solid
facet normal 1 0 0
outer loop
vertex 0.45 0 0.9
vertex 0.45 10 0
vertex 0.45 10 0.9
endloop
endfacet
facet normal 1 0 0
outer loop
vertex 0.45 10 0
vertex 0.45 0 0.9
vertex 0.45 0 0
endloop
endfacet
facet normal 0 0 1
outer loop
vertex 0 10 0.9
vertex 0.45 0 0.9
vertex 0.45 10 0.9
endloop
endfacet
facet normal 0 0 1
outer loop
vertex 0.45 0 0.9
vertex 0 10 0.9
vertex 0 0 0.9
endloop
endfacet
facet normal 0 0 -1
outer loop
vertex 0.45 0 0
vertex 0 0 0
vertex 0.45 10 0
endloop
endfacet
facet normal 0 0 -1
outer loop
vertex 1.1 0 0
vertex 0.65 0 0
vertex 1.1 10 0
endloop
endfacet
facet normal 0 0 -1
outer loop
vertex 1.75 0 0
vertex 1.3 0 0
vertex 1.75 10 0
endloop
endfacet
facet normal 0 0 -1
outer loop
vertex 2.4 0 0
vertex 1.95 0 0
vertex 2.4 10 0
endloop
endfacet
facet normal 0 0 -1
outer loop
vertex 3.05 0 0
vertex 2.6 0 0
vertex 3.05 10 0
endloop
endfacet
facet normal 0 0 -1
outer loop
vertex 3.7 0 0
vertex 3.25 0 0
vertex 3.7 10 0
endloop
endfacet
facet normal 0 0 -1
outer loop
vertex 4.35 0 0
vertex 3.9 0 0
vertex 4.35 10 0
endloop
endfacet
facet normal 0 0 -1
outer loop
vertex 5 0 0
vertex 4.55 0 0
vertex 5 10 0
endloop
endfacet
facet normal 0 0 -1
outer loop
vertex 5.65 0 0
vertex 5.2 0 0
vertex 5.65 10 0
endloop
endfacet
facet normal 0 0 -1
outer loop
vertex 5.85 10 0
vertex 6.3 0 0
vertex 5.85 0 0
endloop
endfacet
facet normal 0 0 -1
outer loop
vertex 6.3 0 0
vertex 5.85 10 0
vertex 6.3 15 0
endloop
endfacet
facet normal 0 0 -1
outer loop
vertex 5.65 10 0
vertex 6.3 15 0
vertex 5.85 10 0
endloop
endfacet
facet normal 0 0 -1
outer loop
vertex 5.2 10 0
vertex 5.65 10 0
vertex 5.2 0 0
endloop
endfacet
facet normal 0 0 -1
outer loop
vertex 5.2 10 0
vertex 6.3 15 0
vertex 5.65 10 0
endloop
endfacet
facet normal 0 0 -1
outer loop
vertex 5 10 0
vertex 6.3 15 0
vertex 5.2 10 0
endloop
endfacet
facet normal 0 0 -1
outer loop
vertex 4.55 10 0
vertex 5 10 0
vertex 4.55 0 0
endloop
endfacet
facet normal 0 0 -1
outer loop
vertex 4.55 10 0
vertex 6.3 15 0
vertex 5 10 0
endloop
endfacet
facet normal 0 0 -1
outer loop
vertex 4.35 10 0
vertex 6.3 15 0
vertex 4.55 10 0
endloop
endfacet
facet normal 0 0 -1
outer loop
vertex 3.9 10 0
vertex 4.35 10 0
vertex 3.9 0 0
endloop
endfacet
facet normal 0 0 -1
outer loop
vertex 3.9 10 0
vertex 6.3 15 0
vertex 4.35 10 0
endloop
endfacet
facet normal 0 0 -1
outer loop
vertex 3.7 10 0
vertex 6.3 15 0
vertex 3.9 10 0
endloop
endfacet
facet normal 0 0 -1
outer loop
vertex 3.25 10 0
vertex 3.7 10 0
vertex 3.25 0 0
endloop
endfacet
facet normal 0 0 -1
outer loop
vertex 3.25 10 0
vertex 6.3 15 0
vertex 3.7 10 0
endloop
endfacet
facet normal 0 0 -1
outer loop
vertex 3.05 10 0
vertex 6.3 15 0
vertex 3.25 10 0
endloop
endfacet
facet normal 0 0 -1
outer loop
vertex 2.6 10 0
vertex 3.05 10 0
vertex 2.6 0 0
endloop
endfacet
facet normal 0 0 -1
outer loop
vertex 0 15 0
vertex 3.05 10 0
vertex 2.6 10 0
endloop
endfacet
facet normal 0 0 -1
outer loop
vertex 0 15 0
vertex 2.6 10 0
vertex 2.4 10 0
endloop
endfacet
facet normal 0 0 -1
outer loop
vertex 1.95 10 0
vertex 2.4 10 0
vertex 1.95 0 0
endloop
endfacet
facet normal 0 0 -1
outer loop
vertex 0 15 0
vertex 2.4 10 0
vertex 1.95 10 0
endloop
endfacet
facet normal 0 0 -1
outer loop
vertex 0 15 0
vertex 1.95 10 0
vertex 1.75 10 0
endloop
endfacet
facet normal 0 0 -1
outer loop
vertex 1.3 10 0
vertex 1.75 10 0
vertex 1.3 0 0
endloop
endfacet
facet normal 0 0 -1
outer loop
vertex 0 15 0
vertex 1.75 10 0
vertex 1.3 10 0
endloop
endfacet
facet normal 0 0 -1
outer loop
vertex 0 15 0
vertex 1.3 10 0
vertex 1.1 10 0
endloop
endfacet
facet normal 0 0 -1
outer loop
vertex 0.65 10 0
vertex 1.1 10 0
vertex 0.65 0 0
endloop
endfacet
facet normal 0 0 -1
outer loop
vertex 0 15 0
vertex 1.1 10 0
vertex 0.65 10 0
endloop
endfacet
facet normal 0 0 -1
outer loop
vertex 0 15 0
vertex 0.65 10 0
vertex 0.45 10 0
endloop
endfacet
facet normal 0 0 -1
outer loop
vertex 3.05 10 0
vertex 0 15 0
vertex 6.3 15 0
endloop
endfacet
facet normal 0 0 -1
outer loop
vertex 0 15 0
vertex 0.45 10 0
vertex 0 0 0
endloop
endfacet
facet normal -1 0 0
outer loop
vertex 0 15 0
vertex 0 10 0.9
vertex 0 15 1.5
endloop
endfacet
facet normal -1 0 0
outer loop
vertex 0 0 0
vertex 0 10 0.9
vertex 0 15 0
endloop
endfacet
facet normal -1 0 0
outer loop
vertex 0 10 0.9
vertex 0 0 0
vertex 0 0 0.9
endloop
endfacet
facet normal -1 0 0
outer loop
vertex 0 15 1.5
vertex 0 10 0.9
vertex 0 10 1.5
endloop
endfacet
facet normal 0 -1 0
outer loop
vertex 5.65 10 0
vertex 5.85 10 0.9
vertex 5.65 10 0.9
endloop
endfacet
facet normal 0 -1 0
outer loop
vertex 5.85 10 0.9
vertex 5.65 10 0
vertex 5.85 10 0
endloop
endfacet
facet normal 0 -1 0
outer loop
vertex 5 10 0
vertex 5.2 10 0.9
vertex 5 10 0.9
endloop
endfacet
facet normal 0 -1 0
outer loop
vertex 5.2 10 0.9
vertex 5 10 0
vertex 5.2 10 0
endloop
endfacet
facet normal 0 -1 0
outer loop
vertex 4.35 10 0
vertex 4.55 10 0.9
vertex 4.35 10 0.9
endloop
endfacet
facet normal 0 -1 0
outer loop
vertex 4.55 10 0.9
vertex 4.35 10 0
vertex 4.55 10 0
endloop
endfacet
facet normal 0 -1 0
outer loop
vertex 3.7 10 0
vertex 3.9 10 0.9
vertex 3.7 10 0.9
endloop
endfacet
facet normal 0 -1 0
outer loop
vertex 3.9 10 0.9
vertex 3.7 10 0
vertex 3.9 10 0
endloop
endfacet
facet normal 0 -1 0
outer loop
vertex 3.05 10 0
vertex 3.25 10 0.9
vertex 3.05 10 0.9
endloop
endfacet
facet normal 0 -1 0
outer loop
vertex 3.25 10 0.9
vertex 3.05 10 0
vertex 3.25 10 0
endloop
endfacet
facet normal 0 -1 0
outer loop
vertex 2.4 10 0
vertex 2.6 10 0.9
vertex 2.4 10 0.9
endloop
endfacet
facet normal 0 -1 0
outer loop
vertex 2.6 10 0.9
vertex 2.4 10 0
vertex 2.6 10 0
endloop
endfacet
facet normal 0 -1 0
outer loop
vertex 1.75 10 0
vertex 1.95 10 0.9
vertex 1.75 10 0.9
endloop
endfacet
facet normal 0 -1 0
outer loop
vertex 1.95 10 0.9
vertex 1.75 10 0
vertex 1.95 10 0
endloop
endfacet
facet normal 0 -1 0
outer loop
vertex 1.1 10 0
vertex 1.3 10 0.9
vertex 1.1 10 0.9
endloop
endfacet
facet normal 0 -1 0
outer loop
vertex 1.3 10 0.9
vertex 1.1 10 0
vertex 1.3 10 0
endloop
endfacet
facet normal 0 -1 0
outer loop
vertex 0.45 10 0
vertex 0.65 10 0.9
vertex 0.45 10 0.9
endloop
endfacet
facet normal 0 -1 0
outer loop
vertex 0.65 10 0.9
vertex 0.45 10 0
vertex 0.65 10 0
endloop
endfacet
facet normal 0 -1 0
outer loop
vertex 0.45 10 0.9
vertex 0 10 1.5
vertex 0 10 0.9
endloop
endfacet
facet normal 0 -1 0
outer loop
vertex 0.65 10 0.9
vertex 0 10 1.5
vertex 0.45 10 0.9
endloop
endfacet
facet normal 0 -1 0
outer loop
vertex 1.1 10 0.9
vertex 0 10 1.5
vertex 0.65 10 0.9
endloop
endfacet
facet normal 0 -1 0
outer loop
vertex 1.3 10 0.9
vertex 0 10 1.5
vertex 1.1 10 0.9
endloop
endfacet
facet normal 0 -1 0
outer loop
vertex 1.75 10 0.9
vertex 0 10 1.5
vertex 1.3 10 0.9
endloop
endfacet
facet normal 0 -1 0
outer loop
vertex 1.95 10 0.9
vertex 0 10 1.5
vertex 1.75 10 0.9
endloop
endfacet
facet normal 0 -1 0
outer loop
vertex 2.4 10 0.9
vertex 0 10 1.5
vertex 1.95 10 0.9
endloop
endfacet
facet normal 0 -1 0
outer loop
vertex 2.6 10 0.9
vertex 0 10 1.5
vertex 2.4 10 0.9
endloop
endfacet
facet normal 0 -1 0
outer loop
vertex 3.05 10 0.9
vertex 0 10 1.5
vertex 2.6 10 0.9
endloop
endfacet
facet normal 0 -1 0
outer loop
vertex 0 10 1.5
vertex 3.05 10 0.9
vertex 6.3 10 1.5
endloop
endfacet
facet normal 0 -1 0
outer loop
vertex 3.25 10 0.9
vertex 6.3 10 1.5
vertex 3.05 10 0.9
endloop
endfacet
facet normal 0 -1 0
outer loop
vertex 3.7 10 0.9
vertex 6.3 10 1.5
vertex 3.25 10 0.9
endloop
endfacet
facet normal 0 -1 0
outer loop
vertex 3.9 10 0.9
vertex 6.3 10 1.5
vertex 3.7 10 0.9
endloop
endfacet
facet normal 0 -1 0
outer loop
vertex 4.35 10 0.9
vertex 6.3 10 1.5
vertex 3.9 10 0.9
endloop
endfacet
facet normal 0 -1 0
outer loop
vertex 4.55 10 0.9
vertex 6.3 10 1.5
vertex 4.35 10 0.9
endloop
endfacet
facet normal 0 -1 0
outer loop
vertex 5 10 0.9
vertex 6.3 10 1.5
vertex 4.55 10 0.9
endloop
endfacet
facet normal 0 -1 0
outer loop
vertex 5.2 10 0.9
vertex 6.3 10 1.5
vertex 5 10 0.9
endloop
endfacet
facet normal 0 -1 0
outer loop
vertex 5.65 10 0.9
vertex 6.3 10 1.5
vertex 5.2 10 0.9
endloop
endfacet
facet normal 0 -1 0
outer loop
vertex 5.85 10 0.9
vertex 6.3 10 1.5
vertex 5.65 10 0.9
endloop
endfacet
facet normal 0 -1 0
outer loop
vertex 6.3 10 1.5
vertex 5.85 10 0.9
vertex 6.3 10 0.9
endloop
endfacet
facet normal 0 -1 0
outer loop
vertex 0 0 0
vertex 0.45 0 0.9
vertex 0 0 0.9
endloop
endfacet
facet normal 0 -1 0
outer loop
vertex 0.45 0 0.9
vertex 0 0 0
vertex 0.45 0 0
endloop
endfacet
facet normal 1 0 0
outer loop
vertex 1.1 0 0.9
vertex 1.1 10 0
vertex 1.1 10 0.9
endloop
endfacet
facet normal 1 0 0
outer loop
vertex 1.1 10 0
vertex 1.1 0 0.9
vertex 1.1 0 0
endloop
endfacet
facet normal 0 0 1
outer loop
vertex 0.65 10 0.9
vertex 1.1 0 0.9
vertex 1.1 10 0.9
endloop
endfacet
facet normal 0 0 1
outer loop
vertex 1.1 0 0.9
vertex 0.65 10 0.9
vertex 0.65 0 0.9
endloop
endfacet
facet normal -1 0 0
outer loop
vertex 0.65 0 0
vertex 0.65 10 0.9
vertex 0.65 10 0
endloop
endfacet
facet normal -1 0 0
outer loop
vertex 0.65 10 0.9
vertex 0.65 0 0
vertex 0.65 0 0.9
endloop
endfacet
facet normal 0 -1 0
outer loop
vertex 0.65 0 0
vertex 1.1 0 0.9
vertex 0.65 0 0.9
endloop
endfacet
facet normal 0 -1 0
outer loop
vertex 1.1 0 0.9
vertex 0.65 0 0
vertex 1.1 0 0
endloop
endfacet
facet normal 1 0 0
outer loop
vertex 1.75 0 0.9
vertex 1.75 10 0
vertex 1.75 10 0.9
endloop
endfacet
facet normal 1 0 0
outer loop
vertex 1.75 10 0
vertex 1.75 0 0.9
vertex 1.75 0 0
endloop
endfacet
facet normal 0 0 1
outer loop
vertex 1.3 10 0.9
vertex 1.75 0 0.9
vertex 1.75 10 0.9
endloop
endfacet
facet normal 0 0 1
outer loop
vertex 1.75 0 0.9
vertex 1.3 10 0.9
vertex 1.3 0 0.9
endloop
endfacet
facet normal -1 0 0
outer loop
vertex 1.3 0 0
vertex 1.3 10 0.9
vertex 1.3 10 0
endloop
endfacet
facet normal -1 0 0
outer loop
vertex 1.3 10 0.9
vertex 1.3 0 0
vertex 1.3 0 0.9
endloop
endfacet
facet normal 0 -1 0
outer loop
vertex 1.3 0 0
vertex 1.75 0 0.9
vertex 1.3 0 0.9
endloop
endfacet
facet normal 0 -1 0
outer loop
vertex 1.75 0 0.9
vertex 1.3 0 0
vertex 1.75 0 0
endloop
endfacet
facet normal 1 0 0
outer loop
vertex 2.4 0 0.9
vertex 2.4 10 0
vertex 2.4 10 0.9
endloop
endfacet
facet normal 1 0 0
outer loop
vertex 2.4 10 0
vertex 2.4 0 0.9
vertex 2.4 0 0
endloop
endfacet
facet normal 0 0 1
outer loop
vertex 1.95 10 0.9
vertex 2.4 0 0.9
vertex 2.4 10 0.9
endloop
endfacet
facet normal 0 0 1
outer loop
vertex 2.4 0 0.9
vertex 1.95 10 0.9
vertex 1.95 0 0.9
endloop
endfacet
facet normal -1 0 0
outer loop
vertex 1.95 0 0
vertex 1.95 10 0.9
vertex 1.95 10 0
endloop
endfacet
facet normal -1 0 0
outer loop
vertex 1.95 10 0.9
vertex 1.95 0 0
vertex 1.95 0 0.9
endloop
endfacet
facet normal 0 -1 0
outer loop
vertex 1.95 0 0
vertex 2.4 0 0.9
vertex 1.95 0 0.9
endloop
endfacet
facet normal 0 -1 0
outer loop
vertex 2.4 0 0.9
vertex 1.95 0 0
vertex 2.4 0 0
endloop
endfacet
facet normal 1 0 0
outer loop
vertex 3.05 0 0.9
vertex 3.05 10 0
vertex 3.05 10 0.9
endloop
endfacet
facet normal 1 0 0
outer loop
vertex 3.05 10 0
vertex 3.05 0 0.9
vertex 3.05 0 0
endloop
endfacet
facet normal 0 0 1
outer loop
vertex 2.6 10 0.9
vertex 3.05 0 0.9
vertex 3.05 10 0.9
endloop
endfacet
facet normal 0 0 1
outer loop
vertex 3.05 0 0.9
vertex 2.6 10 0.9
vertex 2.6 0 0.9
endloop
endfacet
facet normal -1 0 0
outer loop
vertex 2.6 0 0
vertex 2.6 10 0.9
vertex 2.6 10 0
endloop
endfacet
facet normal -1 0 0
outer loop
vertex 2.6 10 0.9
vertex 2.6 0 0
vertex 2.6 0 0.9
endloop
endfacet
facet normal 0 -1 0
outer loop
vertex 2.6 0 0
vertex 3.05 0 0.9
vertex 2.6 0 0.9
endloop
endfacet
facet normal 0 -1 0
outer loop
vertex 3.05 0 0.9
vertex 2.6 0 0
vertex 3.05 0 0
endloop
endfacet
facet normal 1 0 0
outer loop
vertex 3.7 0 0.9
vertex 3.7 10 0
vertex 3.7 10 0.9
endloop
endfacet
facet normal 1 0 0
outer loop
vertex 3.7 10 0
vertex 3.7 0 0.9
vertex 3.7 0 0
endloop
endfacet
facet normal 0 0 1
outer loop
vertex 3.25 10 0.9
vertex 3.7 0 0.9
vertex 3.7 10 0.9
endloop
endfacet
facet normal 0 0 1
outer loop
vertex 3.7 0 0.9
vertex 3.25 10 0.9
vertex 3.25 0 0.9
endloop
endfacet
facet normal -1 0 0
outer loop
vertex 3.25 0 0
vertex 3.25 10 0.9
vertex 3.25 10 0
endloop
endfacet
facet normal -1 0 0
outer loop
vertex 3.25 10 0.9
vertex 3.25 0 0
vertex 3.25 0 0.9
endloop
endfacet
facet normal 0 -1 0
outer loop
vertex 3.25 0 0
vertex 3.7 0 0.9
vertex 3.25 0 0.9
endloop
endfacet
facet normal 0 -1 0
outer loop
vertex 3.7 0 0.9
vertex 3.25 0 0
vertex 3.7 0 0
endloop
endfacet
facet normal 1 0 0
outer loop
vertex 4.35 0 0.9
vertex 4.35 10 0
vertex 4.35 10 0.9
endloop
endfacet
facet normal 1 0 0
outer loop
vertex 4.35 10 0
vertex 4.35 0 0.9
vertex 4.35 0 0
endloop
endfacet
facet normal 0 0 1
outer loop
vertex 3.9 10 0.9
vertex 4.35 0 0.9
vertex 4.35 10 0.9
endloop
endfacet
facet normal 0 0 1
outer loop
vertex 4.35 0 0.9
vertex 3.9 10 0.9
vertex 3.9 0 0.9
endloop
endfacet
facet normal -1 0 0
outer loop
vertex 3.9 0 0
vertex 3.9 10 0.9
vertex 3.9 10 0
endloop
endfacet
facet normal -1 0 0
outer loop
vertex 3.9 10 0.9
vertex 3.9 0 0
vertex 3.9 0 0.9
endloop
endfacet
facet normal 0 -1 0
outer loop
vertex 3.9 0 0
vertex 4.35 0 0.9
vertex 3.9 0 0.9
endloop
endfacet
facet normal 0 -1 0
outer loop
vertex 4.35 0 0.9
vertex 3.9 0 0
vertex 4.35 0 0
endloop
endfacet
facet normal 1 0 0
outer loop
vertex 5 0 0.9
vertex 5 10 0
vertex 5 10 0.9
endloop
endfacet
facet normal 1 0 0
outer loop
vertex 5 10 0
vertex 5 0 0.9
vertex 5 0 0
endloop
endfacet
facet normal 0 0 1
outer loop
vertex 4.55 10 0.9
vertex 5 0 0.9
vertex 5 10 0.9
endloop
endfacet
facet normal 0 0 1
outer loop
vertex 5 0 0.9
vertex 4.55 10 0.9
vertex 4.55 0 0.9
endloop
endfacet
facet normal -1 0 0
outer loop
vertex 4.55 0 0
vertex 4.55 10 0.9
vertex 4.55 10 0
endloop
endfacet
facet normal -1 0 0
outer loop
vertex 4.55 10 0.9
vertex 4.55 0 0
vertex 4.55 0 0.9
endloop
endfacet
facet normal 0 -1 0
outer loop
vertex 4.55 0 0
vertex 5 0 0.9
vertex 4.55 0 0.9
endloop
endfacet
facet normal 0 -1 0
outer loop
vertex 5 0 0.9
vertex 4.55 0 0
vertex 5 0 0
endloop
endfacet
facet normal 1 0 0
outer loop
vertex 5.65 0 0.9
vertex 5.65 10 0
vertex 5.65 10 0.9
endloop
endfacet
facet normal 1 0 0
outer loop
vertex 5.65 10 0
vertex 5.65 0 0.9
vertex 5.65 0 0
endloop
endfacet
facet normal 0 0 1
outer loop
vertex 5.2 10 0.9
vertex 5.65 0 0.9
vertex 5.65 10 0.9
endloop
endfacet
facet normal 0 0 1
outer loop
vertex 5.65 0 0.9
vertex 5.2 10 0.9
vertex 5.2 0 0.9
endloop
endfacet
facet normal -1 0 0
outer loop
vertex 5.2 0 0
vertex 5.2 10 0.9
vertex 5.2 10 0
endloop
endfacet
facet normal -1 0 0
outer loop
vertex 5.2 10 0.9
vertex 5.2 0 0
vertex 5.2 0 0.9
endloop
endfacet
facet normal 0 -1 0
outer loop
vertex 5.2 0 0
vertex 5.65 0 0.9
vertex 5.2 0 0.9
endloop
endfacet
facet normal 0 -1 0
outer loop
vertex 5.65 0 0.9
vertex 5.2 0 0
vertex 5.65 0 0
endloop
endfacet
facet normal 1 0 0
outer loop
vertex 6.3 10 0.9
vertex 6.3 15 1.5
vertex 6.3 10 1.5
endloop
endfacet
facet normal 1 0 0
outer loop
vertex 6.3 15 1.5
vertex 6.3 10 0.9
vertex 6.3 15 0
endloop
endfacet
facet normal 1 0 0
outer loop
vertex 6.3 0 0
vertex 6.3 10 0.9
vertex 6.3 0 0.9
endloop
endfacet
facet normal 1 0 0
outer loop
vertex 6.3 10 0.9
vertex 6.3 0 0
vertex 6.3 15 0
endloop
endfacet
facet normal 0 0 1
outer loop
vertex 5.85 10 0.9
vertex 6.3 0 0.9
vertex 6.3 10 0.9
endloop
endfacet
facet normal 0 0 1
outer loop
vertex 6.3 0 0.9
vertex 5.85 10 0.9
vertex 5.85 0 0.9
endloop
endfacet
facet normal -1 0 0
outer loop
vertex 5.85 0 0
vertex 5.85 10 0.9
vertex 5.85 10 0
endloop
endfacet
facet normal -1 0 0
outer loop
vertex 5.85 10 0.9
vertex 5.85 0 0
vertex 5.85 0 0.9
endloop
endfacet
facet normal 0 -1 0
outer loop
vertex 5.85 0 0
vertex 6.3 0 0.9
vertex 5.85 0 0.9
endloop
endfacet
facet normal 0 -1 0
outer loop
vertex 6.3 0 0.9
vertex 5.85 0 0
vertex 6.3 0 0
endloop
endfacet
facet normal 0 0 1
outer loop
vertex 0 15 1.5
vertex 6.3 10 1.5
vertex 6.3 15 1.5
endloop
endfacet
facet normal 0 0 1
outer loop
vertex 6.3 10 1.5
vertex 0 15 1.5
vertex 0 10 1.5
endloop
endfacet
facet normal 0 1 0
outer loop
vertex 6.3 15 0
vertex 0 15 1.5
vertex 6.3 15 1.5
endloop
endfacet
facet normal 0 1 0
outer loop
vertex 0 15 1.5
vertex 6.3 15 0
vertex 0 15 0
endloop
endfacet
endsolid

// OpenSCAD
toothWidth = 0.45;
toothLength = 10;
toothThickness = 0.9;
toothSpacing = 0.2;
toothCount = 10;

gripWidth = 5;
gripThickness = 1.5;

toothDelta = toothWidth + toothSpacing;

for(i = [0:toothCount - 1]) {
    translate([i * toothDelta, 0, 0])
    cube([toothWidth, toothLength, toothThickness]);
}

translate([0, toothLength, 0])
cube([toothCount * (toothWidth + toothSpacing) - toothSpacing, gripWidth, gripThickness]);
